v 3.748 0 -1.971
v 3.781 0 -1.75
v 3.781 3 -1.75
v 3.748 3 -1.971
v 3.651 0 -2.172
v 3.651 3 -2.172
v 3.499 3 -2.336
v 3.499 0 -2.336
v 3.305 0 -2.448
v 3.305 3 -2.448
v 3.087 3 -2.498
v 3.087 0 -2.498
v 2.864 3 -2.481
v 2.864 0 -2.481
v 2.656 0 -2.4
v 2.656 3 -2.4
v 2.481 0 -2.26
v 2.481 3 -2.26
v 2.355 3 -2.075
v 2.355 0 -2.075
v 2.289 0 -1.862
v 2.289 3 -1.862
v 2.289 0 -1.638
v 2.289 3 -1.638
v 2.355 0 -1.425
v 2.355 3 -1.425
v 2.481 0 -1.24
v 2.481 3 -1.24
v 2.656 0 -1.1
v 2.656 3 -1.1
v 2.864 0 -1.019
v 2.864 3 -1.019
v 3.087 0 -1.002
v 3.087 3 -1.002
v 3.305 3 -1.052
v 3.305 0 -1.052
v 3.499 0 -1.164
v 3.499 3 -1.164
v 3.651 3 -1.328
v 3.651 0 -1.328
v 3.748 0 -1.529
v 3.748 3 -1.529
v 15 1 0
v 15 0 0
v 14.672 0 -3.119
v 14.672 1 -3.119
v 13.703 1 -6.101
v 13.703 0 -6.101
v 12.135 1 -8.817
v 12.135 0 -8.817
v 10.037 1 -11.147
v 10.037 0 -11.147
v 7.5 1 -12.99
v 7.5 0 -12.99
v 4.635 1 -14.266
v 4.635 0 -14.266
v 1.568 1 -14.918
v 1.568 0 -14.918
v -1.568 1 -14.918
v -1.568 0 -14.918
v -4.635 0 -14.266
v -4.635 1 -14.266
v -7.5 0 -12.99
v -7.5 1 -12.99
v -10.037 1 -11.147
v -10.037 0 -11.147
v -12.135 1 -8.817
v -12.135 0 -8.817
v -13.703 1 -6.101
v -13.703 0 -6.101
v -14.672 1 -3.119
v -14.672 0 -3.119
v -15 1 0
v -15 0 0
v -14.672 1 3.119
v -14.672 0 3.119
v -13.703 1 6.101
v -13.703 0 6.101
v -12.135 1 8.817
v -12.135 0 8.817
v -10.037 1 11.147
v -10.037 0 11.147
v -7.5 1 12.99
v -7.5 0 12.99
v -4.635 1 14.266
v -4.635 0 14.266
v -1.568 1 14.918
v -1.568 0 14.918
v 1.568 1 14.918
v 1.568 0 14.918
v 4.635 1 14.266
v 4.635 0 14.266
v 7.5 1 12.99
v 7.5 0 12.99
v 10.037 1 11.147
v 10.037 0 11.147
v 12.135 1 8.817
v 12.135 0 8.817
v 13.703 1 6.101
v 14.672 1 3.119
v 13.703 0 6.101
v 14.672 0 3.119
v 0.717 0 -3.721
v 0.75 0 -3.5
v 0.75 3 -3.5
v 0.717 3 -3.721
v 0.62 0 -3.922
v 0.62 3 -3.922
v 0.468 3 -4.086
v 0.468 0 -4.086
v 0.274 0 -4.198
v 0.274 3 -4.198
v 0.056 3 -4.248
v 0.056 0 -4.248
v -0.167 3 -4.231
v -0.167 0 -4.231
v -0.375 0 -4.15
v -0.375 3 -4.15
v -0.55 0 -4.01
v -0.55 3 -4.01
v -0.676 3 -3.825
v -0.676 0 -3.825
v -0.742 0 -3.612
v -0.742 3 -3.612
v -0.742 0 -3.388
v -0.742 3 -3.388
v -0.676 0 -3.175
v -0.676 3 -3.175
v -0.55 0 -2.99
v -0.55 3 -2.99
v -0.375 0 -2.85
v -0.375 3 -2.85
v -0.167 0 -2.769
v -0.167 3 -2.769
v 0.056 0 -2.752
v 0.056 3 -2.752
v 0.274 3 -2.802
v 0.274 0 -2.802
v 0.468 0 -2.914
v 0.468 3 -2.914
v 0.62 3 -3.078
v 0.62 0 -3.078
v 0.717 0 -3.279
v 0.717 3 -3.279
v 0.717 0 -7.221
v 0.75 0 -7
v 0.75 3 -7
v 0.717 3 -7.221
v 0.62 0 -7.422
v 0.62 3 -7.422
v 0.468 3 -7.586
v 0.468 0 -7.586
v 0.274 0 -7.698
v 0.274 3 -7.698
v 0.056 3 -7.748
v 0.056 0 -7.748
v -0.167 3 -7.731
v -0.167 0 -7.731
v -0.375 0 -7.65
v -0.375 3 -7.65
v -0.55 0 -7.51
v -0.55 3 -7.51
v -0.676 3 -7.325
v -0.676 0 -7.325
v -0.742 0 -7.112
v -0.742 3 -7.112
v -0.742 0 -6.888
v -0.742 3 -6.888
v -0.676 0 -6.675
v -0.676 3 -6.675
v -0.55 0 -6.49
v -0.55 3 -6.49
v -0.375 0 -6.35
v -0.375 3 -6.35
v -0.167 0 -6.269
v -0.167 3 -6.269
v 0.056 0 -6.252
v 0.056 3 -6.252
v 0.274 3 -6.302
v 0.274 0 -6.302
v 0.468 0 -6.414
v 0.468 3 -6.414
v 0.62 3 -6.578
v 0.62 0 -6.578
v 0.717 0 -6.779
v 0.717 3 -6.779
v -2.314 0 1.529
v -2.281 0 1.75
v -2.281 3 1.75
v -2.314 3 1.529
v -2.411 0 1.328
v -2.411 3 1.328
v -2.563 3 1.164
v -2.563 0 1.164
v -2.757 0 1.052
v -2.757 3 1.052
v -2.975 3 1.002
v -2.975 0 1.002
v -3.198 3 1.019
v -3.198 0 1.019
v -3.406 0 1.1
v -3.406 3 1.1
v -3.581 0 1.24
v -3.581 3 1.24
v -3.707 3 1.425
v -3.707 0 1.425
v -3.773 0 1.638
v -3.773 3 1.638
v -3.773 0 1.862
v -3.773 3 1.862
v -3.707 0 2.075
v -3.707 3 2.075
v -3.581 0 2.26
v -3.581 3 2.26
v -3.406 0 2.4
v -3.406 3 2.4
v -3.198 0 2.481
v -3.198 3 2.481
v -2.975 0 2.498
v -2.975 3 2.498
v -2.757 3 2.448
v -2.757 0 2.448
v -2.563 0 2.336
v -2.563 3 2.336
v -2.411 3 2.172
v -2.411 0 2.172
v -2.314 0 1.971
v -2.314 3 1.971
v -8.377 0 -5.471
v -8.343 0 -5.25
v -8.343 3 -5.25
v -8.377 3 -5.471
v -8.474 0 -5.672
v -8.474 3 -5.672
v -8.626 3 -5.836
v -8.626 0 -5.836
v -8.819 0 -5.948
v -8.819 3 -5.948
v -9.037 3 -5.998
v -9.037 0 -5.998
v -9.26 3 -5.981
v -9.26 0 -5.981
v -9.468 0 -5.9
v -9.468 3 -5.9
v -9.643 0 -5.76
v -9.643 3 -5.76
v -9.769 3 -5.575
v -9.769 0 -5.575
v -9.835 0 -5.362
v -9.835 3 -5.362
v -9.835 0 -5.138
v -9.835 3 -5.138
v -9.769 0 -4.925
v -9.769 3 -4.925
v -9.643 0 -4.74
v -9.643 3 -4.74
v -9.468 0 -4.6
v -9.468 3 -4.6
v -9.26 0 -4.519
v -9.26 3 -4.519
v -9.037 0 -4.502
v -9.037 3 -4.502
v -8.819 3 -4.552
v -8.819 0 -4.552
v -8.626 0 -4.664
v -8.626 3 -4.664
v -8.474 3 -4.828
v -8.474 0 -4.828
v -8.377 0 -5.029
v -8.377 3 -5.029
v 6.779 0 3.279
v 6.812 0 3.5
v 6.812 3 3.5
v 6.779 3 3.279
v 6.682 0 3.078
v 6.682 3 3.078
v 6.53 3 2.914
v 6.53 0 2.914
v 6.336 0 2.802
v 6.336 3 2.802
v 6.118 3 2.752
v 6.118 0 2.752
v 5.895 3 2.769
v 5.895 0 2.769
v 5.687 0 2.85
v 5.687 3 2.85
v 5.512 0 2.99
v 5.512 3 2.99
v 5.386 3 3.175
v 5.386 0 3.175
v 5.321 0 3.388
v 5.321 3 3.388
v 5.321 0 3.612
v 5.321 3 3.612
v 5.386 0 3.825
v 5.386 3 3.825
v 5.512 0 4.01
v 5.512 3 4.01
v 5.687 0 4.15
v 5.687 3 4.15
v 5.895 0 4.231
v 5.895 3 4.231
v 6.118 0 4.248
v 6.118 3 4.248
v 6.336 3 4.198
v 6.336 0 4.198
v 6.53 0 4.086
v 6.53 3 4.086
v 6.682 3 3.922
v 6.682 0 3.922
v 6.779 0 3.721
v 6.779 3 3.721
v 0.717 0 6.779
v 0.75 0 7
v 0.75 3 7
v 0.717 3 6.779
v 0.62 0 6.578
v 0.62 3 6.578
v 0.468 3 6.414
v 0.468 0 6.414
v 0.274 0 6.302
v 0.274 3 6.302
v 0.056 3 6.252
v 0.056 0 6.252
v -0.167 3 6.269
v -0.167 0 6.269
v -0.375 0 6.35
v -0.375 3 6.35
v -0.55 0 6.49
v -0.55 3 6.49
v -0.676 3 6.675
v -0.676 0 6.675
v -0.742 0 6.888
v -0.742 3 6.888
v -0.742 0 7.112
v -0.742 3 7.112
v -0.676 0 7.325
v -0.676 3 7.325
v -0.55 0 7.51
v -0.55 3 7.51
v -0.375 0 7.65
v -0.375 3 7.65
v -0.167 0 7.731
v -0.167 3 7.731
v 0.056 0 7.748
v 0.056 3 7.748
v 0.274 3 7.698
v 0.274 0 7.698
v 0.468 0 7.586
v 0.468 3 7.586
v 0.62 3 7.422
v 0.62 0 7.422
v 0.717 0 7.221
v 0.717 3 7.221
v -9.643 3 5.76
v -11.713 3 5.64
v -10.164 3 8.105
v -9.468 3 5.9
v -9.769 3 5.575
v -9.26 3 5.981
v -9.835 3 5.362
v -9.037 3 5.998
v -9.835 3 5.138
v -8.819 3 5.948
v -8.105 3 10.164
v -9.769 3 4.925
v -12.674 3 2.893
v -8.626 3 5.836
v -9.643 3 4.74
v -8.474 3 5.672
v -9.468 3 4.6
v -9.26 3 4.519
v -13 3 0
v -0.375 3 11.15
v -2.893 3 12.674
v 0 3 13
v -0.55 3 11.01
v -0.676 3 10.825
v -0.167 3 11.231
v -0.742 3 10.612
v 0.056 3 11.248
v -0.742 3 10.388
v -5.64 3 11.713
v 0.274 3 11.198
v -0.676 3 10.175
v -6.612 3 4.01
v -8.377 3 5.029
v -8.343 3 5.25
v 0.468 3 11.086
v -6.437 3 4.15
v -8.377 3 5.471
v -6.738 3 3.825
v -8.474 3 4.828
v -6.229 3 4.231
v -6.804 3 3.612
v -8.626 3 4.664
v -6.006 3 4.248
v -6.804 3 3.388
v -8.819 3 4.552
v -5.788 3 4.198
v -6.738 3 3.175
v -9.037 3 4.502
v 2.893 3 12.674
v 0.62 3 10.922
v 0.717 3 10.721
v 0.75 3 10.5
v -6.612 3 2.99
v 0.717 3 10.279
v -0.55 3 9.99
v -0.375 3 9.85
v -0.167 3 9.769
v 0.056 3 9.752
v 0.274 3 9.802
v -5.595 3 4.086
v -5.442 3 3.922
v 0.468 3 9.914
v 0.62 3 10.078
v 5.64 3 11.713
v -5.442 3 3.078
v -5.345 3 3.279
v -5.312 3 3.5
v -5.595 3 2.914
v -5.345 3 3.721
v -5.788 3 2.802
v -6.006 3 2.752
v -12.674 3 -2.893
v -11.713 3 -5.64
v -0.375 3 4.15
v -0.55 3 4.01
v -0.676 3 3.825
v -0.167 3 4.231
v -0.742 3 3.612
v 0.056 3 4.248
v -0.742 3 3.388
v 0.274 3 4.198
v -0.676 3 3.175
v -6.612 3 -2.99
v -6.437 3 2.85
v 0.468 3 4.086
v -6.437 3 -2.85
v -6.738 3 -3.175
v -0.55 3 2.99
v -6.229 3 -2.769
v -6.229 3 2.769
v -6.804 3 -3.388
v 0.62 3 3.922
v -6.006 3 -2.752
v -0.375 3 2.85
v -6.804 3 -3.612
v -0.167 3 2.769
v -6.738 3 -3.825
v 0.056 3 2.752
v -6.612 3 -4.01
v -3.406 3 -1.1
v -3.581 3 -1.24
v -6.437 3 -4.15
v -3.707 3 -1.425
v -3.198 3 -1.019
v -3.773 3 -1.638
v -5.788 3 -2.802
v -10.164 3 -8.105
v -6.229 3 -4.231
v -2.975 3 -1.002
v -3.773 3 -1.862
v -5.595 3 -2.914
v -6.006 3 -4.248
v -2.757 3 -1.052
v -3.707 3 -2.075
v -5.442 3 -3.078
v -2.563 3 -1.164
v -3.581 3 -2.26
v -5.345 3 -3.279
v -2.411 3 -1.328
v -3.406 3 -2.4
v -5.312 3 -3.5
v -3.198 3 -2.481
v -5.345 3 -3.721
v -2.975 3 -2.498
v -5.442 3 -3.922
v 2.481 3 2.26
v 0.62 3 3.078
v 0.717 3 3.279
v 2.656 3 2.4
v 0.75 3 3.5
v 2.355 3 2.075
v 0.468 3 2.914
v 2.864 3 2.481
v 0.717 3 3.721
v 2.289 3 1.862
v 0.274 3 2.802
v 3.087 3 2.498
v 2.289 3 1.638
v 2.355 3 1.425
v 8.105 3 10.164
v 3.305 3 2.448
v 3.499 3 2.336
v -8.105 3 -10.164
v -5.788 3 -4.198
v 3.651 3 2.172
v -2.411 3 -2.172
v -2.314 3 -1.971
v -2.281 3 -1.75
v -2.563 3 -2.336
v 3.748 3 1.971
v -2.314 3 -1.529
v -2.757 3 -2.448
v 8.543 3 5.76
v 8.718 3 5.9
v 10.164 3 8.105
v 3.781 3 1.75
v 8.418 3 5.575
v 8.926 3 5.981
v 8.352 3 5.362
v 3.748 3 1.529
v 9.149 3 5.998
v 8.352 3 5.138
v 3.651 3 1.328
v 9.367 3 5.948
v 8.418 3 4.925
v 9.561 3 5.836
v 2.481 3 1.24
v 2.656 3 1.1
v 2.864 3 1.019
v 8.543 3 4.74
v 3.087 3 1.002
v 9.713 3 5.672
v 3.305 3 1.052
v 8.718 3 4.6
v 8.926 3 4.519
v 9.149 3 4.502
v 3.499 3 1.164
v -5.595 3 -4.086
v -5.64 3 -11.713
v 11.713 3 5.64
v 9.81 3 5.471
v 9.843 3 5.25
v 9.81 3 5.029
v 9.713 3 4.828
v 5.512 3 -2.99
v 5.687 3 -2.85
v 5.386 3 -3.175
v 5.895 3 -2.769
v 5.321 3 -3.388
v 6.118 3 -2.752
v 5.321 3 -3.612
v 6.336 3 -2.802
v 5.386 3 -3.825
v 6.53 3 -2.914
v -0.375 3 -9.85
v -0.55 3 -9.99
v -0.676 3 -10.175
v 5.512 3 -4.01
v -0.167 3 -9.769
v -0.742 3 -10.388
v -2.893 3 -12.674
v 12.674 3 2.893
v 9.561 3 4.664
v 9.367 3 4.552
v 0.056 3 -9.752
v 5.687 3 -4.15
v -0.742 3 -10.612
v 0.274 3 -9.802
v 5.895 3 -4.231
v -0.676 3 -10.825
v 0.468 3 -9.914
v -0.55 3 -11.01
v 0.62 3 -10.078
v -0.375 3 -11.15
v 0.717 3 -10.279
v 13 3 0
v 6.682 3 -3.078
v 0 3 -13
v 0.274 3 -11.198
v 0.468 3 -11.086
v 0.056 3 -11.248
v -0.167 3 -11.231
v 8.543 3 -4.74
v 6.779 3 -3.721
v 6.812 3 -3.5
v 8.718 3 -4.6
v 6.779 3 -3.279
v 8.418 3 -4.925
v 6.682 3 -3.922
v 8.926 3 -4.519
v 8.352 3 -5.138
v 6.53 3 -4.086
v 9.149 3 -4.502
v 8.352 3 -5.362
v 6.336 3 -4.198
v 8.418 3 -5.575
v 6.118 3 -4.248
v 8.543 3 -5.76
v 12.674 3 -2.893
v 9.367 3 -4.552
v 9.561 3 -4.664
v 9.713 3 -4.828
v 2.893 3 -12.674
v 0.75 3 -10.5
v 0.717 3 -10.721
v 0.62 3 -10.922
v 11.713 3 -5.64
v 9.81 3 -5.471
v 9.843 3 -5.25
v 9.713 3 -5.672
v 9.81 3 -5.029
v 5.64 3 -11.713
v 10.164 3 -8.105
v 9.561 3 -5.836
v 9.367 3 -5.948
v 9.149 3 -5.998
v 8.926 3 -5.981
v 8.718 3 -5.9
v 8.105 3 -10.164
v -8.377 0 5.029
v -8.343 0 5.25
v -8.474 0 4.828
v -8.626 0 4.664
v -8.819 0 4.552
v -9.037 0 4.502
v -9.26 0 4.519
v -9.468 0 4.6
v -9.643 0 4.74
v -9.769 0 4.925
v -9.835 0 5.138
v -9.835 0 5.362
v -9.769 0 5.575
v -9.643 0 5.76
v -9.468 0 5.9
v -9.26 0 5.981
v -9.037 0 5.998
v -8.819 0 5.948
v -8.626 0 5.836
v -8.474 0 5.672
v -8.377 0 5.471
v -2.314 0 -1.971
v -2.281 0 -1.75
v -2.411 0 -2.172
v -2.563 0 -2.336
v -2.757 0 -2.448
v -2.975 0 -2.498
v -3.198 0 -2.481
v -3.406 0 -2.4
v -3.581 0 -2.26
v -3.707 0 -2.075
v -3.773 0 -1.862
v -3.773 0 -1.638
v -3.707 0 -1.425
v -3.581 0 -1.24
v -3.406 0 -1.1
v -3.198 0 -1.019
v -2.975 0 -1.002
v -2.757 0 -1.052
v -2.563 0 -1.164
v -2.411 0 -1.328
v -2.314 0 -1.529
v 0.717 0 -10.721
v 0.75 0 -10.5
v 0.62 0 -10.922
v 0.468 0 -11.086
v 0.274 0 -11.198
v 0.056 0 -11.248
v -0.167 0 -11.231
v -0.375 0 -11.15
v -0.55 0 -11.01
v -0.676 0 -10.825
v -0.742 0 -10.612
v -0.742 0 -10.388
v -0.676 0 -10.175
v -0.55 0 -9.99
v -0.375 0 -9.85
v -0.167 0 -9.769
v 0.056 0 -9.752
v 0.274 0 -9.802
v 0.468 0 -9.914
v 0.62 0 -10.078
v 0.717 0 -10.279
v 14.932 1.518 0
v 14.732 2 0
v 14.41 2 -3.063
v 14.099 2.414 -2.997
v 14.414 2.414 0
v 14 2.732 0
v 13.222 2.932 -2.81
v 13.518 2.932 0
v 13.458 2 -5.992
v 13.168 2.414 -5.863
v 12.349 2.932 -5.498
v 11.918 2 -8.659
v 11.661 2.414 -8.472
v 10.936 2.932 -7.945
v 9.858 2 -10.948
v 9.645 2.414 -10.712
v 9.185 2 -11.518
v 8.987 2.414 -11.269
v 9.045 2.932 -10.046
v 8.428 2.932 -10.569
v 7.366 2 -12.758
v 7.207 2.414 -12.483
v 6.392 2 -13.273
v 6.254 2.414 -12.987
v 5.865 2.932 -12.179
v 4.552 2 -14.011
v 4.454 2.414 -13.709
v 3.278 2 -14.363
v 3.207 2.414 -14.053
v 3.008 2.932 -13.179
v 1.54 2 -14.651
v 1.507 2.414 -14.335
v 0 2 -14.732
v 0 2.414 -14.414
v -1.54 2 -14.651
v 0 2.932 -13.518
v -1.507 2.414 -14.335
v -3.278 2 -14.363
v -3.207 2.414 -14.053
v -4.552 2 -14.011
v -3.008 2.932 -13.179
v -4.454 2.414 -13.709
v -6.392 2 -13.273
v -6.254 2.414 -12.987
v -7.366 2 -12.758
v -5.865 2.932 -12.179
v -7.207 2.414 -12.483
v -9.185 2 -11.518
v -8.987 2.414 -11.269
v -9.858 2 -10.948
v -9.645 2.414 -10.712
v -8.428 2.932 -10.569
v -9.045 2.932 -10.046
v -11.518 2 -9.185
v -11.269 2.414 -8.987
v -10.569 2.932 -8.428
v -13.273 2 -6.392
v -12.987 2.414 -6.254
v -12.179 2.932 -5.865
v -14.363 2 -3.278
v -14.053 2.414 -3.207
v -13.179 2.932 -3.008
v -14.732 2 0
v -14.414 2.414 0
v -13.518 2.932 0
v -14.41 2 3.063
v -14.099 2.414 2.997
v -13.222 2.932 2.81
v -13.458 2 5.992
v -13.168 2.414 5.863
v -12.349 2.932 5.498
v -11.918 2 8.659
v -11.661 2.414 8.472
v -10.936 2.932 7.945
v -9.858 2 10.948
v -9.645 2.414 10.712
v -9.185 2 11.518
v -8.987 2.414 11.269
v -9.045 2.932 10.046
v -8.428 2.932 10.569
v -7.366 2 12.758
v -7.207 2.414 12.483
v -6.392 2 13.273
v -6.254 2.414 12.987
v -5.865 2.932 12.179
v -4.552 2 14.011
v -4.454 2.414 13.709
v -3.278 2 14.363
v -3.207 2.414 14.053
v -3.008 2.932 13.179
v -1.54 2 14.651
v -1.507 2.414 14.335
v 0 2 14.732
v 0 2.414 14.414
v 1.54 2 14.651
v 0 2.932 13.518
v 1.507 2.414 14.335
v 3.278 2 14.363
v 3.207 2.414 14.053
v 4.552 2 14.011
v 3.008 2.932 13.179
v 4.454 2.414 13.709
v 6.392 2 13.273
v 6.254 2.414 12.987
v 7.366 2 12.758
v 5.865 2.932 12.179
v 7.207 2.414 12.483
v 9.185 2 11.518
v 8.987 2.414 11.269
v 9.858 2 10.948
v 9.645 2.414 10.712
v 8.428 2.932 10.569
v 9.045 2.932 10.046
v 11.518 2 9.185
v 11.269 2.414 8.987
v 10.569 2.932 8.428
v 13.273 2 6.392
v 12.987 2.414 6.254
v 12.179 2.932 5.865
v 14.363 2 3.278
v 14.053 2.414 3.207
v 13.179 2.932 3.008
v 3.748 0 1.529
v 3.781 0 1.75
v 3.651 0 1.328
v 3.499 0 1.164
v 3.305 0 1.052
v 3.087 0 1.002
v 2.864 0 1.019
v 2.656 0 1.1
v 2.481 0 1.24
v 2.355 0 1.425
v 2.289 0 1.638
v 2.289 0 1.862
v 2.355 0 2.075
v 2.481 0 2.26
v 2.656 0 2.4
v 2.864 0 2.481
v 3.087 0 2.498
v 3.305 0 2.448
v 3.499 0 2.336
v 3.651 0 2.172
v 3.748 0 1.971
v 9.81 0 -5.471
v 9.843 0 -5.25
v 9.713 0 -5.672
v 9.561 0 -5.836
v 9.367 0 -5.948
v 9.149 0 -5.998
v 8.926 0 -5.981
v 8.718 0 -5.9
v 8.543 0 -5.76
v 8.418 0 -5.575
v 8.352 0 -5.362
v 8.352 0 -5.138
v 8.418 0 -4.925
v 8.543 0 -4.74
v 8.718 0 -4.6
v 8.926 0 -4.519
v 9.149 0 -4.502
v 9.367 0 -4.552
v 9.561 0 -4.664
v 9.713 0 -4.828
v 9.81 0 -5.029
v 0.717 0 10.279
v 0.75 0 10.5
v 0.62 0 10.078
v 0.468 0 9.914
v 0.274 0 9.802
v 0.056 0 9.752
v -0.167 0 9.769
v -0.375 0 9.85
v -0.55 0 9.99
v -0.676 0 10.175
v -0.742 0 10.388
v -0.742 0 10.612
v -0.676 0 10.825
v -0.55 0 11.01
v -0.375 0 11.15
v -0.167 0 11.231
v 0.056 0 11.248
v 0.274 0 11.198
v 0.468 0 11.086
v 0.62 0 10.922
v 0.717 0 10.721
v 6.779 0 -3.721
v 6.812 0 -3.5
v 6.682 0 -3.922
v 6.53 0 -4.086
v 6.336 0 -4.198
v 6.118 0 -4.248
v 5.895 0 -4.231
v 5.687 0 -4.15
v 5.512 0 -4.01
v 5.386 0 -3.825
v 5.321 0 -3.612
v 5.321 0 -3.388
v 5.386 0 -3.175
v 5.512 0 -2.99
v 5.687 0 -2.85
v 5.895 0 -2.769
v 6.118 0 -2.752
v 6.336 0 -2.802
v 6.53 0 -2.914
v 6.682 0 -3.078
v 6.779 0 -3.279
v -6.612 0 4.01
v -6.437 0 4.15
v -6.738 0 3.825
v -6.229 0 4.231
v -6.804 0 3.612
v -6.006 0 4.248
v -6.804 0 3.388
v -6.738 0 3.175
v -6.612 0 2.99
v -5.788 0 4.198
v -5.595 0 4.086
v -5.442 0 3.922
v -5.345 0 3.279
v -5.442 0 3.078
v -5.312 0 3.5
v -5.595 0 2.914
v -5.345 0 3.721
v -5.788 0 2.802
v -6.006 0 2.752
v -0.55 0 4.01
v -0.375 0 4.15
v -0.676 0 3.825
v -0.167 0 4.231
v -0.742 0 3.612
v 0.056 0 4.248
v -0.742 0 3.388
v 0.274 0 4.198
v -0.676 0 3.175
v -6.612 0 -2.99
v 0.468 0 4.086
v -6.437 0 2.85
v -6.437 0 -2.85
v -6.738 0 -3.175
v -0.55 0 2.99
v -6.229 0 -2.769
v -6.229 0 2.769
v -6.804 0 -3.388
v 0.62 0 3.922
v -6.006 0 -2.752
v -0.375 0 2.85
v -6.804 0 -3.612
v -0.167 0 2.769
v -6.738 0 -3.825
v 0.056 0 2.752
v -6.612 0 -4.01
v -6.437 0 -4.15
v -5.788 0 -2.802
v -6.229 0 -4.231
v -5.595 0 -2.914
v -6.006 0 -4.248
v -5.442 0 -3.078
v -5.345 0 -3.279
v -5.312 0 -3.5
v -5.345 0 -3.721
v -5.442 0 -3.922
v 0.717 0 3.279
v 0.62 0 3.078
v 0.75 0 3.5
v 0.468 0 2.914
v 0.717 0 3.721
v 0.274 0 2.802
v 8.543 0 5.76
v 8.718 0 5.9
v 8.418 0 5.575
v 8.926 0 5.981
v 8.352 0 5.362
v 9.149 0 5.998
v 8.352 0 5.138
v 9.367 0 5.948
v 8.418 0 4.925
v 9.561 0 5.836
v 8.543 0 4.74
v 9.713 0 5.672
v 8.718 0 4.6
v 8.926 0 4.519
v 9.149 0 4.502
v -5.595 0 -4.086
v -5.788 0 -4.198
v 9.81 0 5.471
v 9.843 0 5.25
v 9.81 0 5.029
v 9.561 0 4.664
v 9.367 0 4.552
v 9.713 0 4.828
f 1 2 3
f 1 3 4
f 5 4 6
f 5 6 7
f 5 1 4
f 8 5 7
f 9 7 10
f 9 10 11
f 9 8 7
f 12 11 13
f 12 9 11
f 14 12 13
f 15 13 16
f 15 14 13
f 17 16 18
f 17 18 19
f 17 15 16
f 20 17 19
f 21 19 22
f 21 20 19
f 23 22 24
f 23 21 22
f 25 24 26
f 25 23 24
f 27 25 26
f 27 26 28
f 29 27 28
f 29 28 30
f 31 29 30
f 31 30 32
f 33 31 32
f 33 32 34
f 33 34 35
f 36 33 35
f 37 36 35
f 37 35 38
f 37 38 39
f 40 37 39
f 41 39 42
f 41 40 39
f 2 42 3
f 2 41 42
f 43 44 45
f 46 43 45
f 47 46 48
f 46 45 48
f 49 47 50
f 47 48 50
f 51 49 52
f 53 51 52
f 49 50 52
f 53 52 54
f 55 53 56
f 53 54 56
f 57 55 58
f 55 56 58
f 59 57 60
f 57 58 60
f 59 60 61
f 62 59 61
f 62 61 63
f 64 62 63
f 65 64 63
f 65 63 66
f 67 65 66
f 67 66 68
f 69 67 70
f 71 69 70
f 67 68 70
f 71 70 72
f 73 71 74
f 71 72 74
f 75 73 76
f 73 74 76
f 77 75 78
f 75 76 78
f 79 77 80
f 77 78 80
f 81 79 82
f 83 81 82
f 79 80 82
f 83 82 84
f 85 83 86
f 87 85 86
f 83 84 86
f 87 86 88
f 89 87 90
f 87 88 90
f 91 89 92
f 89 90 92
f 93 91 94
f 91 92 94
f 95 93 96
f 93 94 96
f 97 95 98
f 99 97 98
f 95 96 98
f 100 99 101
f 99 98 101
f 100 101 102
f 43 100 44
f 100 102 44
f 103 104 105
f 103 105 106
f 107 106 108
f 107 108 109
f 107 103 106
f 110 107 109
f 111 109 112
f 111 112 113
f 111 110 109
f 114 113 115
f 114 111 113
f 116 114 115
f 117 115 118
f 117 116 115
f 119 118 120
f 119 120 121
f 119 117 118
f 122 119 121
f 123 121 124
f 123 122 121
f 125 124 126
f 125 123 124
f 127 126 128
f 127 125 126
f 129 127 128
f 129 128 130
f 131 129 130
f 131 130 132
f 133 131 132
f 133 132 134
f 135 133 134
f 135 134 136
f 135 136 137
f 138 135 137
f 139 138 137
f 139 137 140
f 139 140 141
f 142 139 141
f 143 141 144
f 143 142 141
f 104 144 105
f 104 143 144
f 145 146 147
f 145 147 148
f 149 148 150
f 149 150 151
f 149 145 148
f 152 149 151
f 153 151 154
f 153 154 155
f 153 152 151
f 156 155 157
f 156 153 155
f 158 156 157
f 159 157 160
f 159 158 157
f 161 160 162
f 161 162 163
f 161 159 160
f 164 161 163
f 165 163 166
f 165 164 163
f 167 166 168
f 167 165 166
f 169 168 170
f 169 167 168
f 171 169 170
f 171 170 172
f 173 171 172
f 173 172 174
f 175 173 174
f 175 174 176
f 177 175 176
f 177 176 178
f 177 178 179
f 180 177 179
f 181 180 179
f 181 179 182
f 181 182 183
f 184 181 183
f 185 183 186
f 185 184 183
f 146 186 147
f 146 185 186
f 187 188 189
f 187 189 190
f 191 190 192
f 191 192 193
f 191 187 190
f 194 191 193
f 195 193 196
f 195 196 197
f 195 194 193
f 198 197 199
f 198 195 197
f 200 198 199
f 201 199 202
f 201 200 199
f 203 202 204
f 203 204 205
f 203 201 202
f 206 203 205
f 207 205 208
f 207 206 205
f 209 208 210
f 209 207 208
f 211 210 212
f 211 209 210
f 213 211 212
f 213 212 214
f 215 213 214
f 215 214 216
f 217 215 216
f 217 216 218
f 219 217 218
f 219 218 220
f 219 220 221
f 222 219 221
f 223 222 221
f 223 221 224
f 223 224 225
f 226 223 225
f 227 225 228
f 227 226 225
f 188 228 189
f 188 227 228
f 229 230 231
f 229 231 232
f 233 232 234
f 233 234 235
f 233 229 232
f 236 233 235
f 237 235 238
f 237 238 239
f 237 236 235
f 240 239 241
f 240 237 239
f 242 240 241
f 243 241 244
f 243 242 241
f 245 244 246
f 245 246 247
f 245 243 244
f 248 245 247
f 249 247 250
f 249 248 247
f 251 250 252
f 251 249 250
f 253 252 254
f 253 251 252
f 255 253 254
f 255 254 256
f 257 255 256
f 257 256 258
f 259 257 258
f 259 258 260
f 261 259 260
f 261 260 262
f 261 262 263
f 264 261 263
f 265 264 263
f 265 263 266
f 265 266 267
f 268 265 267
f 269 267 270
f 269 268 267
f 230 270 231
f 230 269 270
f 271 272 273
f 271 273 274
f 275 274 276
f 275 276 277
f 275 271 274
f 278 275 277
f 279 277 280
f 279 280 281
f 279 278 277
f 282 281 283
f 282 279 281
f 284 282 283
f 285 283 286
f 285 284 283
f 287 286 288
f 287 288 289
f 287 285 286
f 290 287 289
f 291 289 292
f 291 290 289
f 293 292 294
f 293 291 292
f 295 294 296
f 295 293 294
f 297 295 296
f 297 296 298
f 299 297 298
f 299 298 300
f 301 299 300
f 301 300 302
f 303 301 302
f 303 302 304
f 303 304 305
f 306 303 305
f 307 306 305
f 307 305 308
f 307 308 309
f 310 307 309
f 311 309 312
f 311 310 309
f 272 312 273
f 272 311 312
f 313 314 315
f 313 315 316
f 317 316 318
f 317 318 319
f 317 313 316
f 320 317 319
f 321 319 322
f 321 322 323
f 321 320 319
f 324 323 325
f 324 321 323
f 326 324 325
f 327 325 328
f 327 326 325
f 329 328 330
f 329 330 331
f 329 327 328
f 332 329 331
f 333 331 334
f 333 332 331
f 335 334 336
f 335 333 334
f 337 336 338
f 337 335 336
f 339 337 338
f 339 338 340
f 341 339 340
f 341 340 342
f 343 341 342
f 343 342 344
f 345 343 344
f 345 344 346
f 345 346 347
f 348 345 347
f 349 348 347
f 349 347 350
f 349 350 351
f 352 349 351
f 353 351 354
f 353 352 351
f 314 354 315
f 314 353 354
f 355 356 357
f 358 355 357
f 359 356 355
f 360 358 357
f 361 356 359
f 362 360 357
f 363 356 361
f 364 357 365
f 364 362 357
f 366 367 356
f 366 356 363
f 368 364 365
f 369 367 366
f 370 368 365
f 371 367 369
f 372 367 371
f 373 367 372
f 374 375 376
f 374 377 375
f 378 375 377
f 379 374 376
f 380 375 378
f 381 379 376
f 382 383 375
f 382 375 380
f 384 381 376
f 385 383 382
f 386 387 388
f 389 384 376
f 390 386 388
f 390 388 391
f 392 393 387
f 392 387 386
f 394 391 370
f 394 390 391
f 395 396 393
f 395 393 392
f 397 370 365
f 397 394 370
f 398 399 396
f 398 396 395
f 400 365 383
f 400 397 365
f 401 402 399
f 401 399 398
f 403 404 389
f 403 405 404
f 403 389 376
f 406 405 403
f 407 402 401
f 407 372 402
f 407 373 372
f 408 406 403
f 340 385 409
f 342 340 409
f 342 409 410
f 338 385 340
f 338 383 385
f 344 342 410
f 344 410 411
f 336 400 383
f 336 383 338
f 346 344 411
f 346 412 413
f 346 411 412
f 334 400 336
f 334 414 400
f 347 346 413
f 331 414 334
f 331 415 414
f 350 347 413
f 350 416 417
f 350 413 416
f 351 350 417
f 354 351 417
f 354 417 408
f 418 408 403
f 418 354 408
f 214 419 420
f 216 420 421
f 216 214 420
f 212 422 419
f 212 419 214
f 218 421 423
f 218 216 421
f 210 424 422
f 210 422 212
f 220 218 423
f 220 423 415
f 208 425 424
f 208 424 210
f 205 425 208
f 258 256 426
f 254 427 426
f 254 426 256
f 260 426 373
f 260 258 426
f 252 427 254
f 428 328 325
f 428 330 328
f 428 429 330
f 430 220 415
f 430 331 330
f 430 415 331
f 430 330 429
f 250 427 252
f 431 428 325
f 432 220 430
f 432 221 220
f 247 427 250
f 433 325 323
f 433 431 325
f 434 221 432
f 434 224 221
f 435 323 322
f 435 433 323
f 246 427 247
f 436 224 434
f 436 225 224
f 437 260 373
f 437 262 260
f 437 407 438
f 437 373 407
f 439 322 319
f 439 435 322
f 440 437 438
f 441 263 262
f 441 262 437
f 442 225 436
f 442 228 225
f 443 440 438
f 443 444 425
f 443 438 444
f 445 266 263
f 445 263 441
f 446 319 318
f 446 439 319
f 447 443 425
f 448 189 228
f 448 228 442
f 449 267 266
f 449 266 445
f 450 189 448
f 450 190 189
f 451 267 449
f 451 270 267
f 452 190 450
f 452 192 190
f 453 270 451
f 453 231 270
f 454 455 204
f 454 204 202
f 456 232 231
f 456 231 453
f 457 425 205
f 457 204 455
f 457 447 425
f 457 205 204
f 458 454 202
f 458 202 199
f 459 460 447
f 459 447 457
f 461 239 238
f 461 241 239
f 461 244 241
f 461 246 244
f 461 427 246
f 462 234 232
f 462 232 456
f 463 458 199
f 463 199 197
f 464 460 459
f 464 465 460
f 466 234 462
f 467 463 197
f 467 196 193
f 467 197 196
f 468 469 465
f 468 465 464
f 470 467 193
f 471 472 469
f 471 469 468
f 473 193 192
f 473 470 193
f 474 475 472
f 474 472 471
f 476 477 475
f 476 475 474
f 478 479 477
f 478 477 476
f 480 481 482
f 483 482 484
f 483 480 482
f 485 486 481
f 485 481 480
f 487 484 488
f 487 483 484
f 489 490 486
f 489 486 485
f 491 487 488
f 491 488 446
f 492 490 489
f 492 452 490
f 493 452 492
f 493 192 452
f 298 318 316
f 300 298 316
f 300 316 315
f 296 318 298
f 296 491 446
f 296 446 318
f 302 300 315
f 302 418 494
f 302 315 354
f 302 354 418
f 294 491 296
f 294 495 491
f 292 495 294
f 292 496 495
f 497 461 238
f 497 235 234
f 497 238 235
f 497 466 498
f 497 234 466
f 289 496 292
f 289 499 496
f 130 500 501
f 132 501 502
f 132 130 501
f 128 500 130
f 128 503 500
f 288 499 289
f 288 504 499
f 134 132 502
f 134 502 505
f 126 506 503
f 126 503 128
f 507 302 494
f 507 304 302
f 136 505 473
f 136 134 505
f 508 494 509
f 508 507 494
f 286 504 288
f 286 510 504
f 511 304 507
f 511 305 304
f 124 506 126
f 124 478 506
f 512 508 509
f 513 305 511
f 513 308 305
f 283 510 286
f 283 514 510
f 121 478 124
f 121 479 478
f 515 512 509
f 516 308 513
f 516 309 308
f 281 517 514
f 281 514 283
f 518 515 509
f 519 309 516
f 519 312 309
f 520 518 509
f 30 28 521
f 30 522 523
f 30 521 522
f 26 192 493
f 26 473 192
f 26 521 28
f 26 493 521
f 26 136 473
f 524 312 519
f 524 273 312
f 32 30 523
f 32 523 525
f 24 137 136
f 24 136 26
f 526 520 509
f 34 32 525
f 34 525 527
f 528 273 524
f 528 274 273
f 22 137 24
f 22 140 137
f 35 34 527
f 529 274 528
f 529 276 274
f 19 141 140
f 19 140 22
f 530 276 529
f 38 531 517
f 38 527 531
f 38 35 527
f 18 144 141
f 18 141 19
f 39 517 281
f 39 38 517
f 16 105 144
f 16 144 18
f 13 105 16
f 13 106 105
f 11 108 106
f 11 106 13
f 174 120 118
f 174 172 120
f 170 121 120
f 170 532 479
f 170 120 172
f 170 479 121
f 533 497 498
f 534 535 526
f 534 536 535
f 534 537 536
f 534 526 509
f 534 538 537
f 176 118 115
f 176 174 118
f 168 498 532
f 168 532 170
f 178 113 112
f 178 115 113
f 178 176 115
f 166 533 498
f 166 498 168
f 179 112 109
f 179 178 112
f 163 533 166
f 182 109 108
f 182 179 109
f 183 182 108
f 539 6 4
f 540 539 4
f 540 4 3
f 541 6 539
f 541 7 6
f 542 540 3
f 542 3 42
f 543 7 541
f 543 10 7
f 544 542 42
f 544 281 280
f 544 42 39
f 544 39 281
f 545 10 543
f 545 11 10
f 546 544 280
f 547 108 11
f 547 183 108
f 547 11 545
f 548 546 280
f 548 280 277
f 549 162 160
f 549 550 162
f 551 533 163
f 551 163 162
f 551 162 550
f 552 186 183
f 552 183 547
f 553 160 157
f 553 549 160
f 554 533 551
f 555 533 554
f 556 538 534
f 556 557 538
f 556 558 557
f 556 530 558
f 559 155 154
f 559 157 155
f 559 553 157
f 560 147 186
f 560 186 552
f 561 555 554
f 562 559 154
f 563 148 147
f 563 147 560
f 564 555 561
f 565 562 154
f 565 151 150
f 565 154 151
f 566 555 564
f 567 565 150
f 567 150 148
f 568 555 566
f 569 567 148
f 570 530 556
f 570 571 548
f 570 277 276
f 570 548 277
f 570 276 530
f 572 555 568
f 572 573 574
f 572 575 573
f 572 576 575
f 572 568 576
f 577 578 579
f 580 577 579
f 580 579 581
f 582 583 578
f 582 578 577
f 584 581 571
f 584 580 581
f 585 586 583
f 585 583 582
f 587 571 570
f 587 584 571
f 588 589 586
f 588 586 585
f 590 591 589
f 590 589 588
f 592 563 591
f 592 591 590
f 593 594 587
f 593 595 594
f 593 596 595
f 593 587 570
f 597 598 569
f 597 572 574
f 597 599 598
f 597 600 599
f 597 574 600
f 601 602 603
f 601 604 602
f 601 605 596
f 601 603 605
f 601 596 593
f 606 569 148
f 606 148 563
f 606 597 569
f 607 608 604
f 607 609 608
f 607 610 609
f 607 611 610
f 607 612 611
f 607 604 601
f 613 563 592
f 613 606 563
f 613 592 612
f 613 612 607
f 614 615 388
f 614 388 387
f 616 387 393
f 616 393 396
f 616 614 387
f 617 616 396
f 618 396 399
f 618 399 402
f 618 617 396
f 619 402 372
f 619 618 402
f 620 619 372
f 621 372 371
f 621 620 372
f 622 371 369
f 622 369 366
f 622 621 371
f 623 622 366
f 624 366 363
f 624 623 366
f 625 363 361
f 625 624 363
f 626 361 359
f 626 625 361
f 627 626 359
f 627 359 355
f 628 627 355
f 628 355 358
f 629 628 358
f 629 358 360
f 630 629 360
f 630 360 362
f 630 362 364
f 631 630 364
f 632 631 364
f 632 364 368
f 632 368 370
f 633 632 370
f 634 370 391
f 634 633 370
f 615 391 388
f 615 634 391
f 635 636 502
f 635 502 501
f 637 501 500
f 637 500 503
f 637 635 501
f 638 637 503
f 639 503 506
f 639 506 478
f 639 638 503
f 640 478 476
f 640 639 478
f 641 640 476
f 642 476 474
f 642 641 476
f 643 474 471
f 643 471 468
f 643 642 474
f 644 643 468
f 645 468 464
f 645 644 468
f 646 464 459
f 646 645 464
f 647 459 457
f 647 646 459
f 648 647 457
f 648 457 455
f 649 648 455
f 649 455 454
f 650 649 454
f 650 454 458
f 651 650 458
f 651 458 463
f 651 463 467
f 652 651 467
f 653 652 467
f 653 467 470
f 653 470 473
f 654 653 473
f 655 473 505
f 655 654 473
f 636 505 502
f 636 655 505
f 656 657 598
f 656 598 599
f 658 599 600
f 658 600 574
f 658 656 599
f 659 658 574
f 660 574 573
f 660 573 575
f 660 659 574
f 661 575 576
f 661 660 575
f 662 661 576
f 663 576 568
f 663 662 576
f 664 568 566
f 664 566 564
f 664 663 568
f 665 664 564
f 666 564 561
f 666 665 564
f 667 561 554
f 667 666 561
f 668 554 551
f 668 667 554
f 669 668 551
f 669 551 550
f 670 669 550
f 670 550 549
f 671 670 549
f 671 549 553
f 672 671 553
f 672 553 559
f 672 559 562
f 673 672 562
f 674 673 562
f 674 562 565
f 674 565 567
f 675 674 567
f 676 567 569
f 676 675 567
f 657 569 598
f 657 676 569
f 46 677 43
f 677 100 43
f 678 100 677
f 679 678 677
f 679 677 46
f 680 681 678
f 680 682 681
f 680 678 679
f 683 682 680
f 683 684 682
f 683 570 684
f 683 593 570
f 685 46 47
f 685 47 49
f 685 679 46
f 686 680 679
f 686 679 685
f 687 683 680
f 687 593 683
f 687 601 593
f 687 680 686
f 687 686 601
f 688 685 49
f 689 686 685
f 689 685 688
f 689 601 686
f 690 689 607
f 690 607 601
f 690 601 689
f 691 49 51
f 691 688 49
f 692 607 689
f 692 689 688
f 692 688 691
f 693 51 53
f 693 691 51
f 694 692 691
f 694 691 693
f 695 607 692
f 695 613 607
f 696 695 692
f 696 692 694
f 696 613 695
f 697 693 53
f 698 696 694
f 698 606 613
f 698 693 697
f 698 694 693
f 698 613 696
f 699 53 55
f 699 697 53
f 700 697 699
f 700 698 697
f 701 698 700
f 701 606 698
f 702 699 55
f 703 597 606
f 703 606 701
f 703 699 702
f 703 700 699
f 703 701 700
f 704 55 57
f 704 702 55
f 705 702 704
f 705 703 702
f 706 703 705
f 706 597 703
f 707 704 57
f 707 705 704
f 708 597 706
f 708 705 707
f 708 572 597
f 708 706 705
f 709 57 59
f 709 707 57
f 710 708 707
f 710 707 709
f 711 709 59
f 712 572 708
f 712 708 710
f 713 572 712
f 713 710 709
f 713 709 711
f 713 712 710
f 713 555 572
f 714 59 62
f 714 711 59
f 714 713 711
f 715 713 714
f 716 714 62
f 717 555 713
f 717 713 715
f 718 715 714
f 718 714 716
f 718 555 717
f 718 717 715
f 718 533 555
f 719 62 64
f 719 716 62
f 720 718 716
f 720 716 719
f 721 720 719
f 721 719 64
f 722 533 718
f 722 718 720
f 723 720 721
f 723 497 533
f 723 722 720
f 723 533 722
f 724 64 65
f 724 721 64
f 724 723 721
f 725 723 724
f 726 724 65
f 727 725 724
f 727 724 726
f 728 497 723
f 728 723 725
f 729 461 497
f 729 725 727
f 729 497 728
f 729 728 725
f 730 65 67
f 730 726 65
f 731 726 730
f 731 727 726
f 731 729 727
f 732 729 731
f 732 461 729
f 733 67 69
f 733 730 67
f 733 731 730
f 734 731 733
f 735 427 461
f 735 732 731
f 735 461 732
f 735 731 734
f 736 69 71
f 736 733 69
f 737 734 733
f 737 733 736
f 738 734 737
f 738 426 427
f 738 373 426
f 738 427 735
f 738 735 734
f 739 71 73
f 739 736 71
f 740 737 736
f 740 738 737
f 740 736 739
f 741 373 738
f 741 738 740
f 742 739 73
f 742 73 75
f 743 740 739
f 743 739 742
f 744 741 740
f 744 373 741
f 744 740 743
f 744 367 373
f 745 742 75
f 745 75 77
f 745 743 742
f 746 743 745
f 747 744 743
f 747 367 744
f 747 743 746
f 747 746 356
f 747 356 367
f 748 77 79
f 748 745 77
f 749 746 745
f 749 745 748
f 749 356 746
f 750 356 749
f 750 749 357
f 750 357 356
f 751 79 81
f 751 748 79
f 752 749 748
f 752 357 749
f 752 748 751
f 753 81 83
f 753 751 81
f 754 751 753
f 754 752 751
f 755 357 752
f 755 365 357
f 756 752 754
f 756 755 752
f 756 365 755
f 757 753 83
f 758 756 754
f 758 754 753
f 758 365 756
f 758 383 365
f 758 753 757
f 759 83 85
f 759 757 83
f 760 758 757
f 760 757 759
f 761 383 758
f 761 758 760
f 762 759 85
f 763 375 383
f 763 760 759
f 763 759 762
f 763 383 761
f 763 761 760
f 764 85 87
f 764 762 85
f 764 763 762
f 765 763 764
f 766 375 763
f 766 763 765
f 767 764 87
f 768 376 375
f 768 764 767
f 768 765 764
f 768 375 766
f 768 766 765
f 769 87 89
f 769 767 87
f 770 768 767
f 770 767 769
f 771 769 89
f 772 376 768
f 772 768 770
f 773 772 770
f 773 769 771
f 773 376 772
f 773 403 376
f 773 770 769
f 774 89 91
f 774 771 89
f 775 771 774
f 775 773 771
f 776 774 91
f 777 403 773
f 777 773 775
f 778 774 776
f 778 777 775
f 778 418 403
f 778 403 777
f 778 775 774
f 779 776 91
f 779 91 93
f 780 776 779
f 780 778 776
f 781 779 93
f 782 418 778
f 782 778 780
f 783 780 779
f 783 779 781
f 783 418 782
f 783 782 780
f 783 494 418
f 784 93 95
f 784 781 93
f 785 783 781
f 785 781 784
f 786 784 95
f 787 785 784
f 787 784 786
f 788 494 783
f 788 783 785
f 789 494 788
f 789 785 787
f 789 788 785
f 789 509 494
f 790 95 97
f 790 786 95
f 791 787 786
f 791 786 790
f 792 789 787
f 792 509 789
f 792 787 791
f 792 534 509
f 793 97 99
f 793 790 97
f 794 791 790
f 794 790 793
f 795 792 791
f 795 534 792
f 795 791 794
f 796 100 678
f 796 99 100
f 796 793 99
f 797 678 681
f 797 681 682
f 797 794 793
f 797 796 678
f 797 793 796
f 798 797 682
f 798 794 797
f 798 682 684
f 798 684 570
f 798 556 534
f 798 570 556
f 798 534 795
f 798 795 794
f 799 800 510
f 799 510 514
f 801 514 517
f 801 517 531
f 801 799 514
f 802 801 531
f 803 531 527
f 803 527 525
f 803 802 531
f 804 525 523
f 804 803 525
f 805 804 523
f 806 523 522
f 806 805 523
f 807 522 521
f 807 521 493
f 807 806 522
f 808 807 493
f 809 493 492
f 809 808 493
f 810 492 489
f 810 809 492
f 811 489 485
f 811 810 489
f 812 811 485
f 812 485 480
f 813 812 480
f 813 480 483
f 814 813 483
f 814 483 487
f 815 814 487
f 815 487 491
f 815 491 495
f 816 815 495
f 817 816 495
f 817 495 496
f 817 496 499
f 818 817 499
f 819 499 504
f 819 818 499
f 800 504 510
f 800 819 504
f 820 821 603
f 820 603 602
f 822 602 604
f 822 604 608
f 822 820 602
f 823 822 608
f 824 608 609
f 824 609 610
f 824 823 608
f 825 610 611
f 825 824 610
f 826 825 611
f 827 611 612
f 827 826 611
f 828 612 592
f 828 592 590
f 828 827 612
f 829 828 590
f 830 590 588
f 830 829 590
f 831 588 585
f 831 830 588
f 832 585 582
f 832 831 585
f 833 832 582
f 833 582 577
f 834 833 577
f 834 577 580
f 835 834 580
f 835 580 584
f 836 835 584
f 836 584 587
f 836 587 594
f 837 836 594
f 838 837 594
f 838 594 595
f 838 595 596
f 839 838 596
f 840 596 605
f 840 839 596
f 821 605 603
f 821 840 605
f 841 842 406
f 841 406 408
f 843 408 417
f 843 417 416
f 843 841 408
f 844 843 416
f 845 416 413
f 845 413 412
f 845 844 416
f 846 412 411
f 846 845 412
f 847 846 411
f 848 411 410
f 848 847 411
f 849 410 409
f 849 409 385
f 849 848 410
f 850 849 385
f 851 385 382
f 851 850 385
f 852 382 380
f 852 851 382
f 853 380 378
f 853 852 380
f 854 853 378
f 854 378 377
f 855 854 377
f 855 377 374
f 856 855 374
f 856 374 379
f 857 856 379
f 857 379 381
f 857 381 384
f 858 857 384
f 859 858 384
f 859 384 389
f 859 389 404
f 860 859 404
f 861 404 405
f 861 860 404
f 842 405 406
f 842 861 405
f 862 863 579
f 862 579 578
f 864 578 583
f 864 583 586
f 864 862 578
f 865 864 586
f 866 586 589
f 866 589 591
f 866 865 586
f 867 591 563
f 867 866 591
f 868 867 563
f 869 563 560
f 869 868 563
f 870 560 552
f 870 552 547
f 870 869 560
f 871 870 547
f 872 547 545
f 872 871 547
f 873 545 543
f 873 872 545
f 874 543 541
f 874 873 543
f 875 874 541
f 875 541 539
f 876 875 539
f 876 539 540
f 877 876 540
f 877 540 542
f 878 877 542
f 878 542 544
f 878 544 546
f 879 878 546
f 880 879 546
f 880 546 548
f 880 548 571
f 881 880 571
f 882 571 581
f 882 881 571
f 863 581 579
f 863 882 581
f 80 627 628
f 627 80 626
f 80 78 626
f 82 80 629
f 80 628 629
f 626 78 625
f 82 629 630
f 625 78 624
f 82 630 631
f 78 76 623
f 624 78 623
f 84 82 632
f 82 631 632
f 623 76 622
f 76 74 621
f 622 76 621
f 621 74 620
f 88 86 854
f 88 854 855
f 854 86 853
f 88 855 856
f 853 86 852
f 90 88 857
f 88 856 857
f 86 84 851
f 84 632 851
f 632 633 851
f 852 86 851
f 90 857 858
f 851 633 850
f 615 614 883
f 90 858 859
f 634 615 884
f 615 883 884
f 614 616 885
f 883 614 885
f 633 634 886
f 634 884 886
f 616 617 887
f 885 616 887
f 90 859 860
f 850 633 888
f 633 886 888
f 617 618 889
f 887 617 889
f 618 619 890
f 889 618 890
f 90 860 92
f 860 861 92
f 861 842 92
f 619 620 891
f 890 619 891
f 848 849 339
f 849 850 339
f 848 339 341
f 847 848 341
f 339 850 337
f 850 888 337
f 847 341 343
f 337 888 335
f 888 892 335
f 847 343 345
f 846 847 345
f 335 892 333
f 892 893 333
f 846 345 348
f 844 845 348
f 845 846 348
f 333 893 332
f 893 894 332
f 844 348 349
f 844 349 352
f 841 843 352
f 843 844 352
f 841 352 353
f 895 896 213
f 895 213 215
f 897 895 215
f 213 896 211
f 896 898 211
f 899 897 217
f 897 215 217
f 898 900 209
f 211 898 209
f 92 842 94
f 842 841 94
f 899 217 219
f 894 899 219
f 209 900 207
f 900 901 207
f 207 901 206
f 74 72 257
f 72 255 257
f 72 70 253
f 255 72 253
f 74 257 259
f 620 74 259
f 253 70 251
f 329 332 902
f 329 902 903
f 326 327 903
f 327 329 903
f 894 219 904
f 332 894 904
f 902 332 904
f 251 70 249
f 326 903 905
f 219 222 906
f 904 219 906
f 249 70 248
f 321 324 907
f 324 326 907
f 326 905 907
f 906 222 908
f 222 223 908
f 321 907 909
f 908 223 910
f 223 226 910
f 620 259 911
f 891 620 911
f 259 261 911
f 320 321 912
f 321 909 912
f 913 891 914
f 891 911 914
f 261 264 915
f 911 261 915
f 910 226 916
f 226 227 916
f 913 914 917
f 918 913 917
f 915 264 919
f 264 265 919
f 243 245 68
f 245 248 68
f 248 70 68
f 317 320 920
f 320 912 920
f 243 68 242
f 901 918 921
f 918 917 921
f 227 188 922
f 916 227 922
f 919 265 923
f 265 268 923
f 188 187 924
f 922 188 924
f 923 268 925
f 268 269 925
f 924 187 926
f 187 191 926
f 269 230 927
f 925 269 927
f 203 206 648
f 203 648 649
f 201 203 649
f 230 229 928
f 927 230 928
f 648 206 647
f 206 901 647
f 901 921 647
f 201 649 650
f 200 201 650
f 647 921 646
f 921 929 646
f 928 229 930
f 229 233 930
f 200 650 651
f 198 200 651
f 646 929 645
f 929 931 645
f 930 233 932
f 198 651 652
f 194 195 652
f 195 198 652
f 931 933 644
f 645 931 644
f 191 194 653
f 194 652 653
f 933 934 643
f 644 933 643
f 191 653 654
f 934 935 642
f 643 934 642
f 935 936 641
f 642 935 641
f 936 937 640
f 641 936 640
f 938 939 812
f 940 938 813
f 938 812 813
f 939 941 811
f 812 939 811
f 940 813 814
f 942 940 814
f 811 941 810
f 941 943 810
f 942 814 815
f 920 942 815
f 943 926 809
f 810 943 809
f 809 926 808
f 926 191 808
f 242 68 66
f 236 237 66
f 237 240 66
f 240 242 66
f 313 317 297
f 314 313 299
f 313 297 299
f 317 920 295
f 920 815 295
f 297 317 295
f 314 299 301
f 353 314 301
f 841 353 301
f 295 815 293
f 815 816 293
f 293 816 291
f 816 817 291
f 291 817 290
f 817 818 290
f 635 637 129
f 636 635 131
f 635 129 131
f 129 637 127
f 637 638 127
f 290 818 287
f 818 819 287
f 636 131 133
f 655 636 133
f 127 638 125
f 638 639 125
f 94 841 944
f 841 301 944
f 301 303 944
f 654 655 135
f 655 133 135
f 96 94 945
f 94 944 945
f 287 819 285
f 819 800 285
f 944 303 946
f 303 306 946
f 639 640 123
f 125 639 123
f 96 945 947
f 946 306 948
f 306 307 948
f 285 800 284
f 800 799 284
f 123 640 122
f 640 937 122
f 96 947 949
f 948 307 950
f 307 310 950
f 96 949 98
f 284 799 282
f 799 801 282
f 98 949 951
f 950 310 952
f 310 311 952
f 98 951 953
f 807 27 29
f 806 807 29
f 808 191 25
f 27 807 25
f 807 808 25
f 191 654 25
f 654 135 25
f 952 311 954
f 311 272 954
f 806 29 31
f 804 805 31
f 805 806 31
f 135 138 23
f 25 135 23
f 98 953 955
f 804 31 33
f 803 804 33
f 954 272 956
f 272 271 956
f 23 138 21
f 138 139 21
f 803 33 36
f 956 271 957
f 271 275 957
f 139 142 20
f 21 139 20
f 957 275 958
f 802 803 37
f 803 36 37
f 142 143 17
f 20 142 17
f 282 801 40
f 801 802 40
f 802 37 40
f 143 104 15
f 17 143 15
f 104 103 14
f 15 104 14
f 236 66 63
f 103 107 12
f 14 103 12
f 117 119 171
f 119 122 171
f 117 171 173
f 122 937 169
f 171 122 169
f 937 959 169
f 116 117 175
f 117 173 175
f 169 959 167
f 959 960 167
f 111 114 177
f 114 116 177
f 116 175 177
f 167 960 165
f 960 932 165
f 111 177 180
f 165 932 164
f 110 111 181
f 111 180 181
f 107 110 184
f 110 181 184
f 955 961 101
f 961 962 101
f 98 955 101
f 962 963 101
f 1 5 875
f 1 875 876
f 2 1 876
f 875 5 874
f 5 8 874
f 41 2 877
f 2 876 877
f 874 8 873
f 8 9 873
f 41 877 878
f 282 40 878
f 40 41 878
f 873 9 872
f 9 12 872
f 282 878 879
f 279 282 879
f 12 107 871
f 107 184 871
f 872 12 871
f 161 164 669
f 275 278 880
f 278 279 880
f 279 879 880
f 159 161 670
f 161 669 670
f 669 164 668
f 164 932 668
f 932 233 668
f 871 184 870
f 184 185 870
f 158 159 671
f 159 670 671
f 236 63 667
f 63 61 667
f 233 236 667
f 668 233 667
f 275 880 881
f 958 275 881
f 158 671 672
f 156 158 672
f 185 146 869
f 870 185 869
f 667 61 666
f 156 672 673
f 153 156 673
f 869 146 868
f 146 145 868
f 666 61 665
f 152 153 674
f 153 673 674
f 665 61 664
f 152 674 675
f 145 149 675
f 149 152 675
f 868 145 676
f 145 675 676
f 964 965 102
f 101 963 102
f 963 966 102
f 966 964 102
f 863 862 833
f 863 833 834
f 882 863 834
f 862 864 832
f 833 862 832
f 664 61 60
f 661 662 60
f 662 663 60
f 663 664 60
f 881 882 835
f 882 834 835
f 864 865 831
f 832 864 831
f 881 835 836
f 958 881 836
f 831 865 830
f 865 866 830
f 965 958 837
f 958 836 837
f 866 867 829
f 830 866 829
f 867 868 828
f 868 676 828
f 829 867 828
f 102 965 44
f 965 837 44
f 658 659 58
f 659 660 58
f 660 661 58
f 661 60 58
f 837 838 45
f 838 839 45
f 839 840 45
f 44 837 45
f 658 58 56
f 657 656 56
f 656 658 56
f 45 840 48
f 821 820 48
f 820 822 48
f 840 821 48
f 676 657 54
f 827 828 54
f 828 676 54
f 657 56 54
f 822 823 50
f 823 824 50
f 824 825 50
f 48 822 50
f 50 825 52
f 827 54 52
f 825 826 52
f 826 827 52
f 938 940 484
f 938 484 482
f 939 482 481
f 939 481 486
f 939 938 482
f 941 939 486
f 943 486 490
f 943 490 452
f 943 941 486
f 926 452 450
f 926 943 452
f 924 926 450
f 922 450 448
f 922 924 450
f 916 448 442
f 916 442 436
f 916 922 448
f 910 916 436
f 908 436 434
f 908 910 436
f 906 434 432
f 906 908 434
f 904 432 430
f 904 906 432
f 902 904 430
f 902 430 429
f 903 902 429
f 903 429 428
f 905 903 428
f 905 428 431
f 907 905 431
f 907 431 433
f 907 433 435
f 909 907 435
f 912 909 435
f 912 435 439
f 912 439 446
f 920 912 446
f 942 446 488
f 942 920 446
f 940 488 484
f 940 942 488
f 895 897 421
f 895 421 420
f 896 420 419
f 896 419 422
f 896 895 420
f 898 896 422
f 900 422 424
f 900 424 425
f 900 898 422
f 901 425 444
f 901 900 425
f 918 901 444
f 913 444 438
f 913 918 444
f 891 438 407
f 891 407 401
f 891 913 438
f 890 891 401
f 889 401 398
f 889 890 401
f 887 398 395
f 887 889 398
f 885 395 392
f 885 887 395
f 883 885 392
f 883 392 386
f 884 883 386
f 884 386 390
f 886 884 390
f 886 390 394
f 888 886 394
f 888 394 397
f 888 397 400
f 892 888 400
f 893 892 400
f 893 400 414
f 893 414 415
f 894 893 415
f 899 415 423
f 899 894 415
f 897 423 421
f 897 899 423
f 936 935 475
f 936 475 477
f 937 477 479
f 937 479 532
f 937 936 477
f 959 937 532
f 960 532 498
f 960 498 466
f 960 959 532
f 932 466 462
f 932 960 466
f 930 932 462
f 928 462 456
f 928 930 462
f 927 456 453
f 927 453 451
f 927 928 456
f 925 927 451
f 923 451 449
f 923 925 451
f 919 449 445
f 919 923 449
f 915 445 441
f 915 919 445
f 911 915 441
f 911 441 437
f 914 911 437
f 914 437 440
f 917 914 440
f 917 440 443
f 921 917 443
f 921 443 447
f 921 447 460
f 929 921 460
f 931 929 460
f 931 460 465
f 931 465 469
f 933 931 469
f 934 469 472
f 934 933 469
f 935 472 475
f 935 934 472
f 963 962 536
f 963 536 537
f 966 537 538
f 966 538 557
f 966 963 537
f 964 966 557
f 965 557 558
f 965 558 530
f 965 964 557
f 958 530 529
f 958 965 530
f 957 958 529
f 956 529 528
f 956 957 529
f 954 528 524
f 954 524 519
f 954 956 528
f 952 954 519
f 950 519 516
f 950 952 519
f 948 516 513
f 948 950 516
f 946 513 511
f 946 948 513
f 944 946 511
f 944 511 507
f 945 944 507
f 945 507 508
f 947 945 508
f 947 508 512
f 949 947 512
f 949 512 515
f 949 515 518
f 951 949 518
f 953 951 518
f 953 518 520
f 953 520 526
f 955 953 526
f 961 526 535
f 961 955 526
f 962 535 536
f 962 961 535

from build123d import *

# Parameters (mm, degrees)
SKETCH1_R           = 15
SKETCH1_R_2         = 0.75
BOSS_EXTRUDE1_DEPTH = 3
FILLET1_R           = 2


with BuildPart() as part:
    # Sketch1 → Boss-Extrude1 (new body)
    with BuildSketch(Plane(origin=(0, 0, 0), x_dir=(1, 0, 0), z_dir=(0, 1, 0))):
        Circle(SKETCH1_R)
        with Locations((0, 10.5)):
            Circle(SKETCH1_R_2, mode=Mode.SUBTRACT)
        with Locations((0, 7)):
            Circle(SKETCH1_R_2, mode=Mode.SUBTRACT)
        with Locations((0, 3.5)):
            Circle(SKETCH1_R_2, mode=Mode.SUBTRACT)
        with Locations((3.031088913, 1.75)):
            Circle(SKETCH1_R_2, mode=Mode.SUBTRACT)
        with Locations((6.062177826, 3.5)):
            Circle(SKETCH1_R_2, mode=Mode.SUBTRACT)
        with Locations((9.09326674, 5.25)):
            Circle(SKETCH1_R_2, mode=Mode.SUBTRACT)
        with Locations((3.031088913, -1.75)):
            Circle(SKETCH1_R_2, mode=Mode.SUBTRACT)
        with Locations((6.062177826, -3.5)):
            Circle(SKETCH1_R_2, mode=Mode.SUBTRACT)
        with Locations((9.09326674, -5.25)):
            Circle(SKETCH1_R_2, mode=Mode.SUBTRACT)
        with Locations((0, -3.5)):
            Circle(SKETCH1_R_2, mode=Mode.SUBTRACT)
        with Locations((0, -7)):
            Circle(SKETCH1_R_2, mode=Mode.SUBTRACT)
        with Locations((0, -10.5)):
            Circle(SKETCH1_R_2, mode=Mode.SUBTRACT)
        with Locations((-3.031088913, -1.75)):
            Circle(SKETCH1_R_2, mode=Mode.SUBTRACT)
        with Locations((-6.062177826, -3.5)):
            Circle(SKETCH1_R_2, mode=Mode.SUBTRACT)
        with Locations((-9.09326674, -5.25)):
            Circle(SKETCH1_R_2, mode=Mode.SUBTRACT)
        with Locations((-3.031088913, 1.75)):
            Circle(SKETCH1_R_2, mode=Mode.SUBTRACT)
        with Locations((-6.062177826, 3.5)):
            Circle(SKETCH1_R_2, mode=Mode.SUBTRACT)
        with Locations((-9.09326674, 5.25)):
            Circle(SKETCH1_R_2, mode=Mode.SUBTRACT)
    extrude(amount=BOSS_EXTRUDE1_DEPTH)

    # Fillet1
    fillet1_edges = [part.edges().sort_by_distance(p)[0] for p in [
        (-15, 3, 0),
    ]]
    fillet(fillet1_edges, radius=FILLET1_R)


solid = part.part
